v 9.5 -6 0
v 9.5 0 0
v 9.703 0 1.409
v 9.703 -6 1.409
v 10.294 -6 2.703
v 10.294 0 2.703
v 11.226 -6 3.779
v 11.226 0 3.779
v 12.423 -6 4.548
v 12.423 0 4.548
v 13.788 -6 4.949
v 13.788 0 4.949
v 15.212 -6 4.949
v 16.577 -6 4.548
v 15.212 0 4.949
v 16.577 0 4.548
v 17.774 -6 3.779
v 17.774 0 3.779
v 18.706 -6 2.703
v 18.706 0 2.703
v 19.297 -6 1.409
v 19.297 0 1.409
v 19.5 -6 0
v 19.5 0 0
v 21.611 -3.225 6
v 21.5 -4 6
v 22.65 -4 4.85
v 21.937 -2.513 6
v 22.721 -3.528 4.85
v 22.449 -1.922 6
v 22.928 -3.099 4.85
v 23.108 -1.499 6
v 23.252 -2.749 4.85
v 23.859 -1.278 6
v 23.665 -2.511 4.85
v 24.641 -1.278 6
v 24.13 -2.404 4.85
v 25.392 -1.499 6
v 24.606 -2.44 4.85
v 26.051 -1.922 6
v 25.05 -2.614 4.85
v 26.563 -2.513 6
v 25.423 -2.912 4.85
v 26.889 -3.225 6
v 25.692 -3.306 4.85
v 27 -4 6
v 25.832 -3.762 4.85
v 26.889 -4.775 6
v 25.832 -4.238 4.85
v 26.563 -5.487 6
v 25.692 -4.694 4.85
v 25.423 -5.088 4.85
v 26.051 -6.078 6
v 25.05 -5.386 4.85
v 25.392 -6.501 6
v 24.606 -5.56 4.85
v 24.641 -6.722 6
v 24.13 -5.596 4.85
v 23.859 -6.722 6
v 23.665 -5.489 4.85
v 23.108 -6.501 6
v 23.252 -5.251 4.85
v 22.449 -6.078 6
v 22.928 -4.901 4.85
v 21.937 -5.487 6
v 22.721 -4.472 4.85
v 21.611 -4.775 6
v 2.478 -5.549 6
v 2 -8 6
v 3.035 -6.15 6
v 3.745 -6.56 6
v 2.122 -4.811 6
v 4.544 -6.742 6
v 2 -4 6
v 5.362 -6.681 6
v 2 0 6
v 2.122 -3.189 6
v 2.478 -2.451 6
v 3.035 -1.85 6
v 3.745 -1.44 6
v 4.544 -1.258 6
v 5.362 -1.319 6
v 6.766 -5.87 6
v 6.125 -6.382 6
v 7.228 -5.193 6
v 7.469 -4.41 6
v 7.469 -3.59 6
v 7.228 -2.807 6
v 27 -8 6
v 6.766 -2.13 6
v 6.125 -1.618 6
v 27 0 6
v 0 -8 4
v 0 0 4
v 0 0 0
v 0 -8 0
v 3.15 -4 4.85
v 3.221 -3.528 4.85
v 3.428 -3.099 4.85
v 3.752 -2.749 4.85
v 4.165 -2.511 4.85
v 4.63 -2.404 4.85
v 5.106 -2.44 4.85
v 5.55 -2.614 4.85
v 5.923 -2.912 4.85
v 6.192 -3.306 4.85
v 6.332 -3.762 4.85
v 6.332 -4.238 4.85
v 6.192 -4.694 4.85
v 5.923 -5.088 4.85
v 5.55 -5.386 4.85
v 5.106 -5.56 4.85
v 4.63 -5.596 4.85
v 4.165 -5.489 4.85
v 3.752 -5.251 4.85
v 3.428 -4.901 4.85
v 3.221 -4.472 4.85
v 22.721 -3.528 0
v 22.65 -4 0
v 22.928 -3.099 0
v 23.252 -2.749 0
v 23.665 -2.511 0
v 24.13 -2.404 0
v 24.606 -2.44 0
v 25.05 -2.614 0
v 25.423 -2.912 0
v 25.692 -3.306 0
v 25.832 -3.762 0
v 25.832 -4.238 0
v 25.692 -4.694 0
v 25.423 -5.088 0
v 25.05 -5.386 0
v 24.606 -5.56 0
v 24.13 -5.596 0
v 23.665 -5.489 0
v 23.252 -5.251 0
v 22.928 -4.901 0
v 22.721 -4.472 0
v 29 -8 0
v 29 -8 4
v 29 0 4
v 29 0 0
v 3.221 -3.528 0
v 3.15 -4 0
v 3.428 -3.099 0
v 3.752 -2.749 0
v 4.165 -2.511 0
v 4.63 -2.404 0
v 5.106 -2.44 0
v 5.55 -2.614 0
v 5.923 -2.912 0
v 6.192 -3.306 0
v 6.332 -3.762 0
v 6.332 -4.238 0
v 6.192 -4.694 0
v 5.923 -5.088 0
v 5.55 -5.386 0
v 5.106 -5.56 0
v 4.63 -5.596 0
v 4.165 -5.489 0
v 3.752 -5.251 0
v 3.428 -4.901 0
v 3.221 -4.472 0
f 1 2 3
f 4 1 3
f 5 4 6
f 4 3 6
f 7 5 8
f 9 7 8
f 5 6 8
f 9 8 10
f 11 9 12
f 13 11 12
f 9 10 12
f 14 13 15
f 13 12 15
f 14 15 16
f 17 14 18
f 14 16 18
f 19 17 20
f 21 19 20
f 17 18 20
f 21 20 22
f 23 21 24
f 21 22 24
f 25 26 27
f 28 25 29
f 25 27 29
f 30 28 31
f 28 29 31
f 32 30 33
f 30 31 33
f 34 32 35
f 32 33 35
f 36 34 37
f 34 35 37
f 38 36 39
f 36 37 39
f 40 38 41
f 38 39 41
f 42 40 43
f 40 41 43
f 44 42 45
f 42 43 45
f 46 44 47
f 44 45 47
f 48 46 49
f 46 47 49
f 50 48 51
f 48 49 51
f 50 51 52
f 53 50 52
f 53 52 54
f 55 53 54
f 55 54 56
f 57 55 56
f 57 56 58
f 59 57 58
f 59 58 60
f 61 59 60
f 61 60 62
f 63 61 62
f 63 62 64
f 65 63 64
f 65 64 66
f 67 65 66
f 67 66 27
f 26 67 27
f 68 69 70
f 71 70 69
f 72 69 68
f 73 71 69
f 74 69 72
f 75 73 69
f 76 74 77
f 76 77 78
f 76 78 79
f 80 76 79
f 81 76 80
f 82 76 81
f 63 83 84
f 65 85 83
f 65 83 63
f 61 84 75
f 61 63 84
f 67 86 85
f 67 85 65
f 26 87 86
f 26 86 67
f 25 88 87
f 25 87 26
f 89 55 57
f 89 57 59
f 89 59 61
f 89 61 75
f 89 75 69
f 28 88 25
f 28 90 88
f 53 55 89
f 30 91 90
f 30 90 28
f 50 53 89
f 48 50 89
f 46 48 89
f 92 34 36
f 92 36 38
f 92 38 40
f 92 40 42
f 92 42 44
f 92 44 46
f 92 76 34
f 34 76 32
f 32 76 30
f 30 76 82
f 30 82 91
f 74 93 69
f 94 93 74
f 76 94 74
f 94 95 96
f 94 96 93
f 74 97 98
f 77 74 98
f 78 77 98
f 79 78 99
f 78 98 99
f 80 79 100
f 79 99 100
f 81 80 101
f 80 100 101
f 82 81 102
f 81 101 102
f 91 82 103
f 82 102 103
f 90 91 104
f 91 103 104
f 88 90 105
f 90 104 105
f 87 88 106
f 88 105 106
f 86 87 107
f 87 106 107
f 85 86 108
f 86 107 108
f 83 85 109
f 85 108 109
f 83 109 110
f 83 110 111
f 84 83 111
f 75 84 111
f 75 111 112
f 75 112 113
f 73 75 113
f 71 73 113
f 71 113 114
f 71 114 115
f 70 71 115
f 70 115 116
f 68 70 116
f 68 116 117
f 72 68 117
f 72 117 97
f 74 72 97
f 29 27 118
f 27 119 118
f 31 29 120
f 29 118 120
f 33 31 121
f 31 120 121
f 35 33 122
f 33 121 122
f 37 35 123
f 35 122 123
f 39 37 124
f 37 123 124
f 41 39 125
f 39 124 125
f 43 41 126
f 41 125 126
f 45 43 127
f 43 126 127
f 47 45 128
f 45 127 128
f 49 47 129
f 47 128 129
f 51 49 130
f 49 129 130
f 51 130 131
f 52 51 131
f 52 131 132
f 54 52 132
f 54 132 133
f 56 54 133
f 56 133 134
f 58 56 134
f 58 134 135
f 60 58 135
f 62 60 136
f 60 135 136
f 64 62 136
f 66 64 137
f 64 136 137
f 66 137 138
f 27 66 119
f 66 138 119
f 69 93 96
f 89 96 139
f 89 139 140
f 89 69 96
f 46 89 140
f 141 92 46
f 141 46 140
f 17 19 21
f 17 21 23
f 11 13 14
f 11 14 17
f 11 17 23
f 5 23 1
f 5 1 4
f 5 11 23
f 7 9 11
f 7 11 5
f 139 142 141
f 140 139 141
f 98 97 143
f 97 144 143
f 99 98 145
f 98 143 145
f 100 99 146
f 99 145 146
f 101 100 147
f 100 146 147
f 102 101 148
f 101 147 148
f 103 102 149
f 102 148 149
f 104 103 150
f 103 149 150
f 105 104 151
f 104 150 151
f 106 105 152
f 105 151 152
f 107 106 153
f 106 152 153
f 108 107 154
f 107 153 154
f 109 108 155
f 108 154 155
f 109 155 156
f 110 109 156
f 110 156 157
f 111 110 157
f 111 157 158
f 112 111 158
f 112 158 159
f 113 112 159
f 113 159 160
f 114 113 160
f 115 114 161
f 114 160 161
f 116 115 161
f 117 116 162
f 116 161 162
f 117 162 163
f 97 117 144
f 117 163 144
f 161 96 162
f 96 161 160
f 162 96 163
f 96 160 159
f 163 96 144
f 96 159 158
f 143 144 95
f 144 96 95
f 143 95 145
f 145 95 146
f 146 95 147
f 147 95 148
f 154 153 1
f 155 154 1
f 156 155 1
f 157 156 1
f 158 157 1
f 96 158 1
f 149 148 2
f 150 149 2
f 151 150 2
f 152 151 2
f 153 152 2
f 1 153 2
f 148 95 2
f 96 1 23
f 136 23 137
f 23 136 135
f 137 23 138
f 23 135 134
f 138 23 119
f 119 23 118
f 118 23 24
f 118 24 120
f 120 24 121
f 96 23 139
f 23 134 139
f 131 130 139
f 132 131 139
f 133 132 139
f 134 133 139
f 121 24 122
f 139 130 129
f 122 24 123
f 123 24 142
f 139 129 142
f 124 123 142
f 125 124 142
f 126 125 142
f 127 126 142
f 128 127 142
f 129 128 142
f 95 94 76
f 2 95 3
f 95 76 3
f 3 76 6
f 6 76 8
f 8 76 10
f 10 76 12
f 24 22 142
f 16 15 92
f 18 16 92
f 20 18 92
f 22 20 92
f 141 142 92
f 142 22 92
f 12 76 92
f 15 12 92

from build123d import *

# Parameters (mm, degrees)
F0_W           = 29
F0_H           = 6
F1_DEPTH       = 8
F2_R           = 5
F3_DEPTH       = 6
F5_D           = 3.2
F5_DEPTH       = 10
F5_CSINK_D     = 5.5
F5_CSINK_ANGLE = 90
F5_TIP         = 0.9613769904
F6_T1_DEPTH    = 18.2867319519


# Not quite as in the source:
# - a fillet or chamfer that OpenCascade refuses, or shapes differently, is made with other operations: its cross-section is extruded or revolved along the edge and cut away or added


with BuildPart() as f1:
    # F0 (on Front) → F1 (new body)
    with BuildSketch(Plane.XZ):
        with Locations((14.5, 3)):
            Rectangle(F0_W, F0_H)
    extrude(amount=F1_DEPTH)

    # F2 (on face) → F3 (cut)
    with BuildSketch(Plane(origin=(0, 0, 0), x_dir=(-1, 0, 0), z_dir=(0, 1, 0))):
        with Locations((-14.5, 0)):
            Circle(F2_R)
    extrude(amount=-F3_DEPTH, mode=Mode.SUBTRACT)

    # F5
    with Locations(Plane.XY.offset(6)):
        with Locations((4.75, -4), (24.25, -4)):
            CounterSinkHole(F5_D / 2, F5_CSINK_D / 2, depth=F5_DEPTH, counter_sink_angle=F5_CSINK_ANGLE)
            with Locations((0, 0, -(F5_DEPTH + F5_TIP / 2))):  # 118° drill point
                Cone(0, F5_D / 2, F5_TIP, mode=Mode.SUBTRACT)

    # F6: chamfer of 2 on 2 edges, made by hand

    # F6_s2 → F6_t1 (cut)
    with BuildSketch(Plane.XZ.offset(-5.1433659759)):
        Polygon((27, 6), (29, 4), (29, 6), align=None)
        Polygon((0, 4), (2, 6), (0, 6), align=None)
    extrude(amount=F6_T1_DEPTH, mode=Mode.SUBTRACT)


solid = f1.part
